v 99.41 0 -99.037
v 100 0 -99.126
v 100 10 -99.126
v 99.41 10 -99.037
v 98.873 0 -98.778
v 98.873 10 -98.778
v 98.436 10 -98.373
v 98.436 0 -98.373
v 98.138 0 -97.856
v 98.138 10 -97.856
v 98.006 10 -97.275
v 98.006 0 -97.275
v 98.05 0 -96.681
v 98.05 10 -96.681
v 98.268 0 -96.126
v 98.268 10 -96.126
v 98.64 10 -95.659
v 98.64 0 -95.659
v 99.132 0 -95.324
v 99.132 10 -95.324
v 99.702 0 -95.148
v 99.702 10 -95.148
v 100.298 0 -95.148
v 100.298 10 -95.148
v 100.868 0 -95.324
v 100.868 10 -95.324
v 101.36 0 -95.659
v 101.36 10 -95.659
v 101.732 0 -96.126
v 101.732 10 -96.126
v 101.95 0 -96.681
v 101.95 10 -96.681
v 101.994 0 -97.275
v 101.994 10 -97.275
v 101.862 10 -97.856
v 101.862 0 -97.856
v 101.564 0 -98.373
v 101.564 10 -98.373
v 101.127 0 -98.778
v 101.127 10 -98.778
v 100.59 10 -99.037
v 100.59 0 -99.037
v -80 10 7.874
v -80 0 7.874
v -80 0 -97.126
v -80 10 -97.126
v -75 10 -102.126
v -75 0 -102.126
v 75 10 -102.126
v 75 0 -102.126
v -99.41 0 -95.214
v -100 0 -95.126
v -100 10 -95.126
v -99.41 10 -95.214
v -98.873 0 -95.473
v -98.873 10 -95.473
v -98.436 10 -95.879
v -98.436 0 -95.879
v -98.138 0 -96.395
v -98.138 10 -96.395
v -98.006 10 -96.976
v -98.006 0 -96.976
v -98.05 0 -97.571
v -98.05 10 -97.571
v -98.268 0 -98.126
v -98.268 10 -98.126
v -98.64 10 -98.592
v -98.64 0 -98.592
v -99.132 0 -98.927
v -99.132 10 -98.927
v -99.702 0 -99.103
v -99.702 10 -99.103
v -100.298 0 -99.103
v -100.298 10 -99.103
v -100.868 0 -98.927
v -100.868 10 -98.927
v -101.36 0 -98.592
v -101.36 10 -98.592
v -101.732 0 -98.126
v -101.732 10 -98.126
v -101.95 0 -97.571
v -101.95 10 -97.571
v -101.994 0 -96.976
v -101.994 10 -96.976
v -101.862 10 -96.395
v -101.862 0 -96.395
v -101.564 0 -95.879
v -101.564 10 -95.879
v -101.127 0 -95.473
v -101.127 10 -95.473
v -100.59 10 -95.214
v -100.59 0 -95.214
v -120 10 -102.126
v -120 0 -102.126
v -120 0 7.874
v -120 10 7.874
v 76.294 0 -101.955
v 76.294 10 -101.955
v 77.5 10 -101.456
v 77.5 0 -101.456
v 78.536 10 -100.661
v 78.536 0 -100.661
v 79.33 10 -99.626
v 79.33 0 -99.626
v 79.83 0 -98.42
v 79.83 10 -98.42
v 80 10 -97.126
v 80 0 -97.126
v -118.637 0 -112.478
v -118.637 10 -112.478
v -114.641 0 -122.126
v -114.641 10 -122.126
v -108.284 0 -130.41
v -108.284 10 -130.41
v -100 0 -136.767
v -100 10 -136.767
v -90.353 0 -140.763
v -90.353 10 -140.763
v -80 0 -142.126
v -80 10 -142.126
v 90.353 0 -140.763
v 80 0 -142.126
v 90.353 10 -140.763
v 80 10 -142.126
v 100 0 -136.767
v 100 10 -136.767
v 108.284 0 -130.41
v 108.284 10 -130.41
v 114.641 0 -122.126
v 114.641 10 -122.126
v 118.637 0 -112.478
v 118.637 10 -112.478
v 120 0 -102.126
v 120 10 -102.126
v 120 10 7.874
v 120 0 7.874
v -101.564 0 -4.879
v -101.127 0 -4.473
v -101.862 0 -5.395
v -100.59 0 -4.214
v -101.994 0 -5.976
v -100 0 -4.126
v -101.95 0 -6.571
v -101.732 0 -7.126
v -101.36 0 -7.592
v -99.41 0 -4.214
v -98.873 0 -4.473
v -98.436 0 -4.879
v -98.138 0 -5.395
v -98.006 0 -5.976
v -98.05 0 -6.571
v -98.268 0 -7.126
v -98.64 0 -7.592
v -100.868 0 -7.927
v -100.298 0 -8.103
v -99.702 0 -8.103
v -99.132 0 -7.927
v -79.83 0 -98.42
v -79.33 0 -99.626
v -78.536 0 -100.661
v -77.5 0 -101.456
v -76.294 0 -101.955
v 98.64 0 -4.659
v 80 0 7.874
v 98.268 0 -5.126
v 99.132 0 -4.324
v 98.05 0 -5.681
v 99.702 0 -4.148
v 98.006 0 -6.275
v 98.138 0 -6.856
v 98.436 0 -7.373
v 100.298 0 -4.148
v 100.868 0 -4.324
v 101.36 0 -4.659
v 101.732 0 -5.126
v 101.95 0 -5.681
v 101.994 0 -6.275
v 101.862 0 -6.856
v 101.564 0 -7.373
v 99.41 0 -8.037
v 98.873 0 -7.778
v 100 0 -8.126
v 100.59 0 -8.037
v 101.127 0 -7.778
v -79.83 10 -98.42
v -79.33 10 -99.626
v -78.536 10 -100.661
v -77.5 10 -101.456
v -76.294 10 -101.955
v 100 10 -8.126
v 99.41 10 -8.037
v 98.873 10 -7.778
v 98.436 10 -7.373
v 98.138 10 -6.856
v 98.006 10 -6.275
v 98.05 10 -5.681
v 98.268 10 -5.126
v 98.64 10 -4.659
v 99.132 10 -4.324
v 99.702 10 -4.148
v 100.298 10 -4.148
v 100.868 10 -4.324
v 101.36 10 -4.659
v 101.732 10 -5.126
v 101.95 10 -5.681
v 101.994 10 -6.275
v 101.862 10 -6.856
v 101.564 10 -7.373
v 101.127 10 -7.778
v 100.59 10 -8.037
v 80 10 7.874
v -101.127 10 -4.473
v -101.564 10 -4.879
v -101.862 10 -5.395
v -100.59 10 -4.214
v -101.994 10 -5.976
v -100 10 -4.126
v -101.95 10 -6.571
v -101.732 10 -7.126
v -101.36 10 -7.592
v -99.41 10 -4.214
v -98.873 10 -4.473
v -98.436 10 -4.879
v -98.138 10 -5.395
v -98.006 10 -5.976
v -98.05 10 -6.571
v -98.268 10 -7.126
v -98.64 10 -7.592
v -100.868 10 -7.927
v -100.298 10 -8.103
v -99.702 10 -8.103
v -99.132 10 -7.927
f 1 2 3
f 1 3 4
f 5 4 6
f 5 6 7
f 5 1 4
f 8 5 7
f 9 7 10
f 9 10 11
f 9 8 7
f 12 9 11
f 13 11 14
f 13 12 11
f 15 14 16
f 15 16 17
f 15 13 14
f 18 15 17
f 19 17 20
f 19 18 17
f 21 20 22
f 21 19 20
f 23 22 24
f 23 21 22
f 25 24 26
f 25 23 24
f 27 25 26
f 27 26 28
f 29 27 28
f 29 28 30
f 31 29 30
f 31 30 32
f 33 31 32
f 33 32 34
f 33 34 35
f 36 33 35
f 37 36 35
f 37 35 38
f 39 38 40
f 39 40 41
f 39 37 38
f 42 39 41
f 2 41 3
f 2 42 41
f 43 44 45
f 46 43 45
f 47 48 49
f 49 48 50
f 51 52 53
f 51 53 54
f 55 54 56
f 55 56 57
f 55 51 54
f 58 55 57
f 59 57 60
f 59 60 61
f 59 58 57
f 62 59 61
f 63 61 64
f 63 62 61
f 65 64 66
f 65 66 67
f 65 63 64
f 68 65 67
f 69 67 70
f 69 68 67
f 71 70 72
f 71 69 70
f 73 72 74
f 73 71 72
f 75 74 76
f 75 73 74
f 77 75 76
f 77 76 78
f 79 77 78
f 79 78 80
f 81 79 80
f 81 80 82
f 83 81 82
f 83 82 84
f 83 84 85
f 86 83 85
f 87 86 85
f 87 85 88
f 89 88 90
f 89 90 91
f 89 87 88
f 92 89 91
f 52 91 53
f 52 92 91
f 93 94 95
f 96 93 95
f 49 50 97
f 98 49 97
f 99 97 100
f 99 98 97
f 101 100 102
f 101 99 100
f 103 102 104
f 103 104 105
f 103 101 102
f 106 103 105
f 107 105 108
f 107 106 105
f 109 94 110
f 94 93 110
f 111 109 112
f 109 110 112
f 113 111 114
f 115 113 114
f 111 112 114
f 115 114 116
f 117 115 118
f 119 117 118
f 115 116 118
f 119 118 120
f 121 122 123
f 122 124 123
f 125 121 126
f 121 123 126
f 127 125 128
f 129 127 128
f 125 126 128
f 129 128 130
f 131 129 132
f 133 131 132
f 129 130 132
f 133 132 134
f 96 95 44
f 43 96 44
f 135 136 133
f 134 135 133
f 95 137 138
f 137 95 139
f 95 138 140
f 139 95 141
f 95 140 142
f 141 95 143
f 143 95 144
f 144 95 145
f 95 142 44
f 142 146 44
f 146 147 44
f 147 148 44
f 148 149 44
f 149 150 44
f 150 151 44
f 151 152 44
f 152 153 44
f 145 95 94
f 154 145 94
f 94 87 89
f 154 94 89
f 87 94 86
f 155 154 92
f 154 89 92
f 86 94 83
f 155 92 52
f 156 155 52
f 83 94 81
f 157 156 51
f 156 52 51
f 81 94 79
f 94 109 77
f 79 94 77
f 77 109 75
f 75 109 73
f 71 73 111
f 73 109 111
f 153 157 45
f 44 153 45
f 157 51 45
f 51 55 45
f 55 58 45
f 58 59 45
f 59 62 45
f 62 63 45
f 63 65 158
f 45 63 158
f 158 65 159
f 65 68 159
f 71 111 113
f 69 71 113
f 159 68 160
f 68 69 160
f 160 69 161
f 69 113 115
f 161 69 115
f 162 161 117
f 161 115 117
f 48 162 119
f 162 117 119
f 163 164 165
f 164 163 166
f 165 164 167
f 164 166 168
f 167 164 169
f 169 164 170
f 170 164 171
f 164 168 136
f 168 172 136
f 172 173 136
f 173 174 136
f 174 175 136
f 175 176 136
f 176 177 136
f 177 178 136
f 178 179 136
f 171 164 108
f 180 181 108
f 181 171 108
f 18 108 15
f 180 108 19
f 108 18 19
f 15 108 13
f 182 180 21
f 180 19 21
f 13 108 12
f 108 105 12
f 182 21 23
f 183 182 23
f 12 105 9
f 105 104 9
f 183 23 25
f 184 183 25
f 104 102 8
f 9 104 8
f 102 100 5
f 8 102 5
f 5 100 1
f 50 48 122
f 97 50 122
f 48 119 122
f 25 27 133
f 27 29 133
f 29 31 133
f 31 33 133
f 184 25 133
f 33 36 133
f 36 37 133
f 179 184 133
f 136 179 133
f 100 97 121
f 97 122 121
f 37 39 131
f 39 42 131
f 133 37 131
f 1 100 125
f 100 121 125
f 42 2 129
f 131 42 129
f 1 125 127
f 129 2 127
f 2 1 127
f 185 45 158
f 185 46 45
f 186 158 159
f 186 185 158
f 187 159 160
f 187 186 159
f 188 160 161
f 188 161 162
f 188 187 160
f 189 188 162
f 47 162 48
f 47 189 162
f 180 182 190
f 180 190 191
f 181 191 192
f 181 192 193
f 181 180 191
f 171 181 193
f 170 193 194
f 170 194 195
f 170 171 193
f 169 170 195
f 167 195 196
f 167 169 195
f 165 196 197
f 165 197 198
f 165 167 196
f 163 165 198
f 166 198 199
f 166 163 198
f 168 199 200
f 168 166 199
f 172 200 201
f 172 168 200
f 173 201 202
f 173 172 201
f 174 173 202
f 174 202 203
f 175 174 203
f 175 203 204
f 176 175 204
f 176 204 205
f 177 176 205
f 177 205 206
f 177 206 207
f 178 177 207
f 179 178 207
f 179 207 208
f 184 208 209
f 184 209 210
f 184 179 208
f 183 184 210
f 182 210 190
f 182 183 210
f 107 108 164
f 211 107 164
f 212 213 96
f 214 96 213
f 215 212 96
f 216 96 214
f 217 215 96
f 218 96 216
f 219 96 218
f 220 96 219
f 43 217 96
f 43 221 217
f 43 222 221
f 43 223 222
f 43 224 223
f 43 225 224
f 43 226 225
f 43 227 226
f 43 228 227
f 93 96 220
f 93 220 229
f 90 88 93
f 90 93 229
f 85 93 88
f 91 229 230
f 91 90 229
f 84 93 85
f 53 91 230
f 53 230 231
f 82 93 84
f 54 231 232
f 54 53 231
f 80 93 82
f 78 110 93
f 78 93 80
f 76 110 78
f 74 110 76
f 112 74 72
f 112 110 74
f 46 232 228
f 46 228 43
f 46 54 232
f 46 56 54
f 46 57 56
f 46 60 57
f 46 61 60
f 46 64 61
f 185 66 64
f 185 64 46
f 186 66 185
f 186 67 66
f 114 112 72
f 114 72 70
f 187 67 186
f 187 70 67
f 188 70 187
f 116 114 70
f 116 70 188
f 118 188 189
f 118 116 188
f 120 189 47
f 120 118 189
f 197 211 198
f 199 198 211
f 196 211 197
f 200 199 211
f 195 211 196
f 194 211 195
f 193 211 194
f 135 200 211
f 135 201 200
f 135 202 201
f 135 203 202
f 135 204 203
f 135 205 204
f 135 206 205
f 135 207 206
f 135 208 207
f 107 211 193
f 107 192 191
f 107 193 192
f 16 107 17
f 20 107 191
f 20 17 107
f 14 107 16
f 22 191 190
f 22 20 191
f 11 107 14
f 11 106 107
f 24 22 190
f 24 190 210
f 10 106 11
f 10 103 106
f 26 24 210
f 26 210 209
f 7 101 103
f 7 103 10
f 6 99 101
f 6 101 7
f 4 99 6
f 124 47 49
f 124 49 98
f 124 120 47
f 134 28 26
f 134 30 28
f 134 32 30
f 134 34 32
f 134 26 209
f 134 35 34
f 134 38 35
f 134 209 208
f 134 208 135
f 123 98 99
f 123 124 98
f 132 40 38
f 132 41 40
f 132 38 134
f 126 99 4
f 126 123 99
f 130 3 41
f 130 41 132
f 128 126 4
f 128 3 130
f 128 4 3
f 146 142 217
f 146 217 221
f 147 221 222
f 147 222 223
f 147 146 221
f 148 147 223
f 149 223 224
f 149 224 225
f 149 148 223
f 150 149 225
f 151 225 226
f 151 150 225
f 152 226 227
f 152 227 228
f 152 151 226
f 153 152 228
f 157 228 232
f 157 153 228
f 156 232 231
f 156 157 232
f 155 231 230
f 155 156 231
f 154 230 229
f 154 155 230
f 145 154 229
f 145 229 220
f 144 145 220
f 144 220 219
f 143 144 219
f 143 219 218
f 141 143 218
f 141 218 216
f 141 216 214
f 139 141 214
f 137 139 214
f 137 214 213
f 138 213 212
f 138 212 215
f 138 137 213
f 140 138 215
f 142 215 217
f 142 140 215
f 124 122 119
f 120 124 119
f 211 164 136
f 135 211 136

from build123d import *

# Parameters (mm, degrees)
SKETCH_1_R      = 2
EXTRUDE_1_DEPTH = 10
FILLET_1_R      = 40
FILLET_2_R      = 5


with BuildPart() as part:
    # 草图1 → 凸台-拉伸1 (new body)
    with BuildSketch(Plane(origin=(0, 0, 0), x_dir=(1, 0, 0), z_dir=(0, 1, 0))):
        Polygon((-120, 142.125556732), (-120, -7.874443268), (-80, -7.874443268), (-80, 102.125556732), (80, 102.125556732), (80, -7.874443268), (120, -7.874443268), (120, 142.125556732), align=None)
        with Locations(Location((-100, 97.125556732, 0), (0, 0, 270))):
            Circle(SKETCH_1_R, mode=Mode.SUBTRACT)
        with Locations(Location((100, 97.125556732, 0), (0, 0, 90))):
            Circle(SKETCH_1_R, mode=Mode.SUBTRACT)
        with Locations(Location((-100, 6.125556732, 0), (0, 0, 270))):
            Circle(SKETCH_1_R, mode=Mode.SUBTRACT)
        with Locations(Location((100, 6.125556732, 0), (0, 0, 90))):
            Circle(SKETCH_1_R, mode=Mode.SUBTRACT)
    extrude(amount=EXTRUDE_1_DEPTH)

    # 圆角1
    fillet_1_edges = [part.edges().sort_by_distance(p)[0] for p in [
        (-120, 5, -142.125556732),
        (120, 5, -142.125556732),
    ]]
    fillet(fillet_1_edges, radius=FILLET_1_R)

    # 圆角2
    fillet_2_edges = [part.edges().sort_by_distance(p)[0] for p in [
        (80, 5, -102.125556732),
        (-80, 5, -102.125556732),
    ]]
    fillet(fillet_2_edges, radius=FILLET_2_R)


solid = part.part
